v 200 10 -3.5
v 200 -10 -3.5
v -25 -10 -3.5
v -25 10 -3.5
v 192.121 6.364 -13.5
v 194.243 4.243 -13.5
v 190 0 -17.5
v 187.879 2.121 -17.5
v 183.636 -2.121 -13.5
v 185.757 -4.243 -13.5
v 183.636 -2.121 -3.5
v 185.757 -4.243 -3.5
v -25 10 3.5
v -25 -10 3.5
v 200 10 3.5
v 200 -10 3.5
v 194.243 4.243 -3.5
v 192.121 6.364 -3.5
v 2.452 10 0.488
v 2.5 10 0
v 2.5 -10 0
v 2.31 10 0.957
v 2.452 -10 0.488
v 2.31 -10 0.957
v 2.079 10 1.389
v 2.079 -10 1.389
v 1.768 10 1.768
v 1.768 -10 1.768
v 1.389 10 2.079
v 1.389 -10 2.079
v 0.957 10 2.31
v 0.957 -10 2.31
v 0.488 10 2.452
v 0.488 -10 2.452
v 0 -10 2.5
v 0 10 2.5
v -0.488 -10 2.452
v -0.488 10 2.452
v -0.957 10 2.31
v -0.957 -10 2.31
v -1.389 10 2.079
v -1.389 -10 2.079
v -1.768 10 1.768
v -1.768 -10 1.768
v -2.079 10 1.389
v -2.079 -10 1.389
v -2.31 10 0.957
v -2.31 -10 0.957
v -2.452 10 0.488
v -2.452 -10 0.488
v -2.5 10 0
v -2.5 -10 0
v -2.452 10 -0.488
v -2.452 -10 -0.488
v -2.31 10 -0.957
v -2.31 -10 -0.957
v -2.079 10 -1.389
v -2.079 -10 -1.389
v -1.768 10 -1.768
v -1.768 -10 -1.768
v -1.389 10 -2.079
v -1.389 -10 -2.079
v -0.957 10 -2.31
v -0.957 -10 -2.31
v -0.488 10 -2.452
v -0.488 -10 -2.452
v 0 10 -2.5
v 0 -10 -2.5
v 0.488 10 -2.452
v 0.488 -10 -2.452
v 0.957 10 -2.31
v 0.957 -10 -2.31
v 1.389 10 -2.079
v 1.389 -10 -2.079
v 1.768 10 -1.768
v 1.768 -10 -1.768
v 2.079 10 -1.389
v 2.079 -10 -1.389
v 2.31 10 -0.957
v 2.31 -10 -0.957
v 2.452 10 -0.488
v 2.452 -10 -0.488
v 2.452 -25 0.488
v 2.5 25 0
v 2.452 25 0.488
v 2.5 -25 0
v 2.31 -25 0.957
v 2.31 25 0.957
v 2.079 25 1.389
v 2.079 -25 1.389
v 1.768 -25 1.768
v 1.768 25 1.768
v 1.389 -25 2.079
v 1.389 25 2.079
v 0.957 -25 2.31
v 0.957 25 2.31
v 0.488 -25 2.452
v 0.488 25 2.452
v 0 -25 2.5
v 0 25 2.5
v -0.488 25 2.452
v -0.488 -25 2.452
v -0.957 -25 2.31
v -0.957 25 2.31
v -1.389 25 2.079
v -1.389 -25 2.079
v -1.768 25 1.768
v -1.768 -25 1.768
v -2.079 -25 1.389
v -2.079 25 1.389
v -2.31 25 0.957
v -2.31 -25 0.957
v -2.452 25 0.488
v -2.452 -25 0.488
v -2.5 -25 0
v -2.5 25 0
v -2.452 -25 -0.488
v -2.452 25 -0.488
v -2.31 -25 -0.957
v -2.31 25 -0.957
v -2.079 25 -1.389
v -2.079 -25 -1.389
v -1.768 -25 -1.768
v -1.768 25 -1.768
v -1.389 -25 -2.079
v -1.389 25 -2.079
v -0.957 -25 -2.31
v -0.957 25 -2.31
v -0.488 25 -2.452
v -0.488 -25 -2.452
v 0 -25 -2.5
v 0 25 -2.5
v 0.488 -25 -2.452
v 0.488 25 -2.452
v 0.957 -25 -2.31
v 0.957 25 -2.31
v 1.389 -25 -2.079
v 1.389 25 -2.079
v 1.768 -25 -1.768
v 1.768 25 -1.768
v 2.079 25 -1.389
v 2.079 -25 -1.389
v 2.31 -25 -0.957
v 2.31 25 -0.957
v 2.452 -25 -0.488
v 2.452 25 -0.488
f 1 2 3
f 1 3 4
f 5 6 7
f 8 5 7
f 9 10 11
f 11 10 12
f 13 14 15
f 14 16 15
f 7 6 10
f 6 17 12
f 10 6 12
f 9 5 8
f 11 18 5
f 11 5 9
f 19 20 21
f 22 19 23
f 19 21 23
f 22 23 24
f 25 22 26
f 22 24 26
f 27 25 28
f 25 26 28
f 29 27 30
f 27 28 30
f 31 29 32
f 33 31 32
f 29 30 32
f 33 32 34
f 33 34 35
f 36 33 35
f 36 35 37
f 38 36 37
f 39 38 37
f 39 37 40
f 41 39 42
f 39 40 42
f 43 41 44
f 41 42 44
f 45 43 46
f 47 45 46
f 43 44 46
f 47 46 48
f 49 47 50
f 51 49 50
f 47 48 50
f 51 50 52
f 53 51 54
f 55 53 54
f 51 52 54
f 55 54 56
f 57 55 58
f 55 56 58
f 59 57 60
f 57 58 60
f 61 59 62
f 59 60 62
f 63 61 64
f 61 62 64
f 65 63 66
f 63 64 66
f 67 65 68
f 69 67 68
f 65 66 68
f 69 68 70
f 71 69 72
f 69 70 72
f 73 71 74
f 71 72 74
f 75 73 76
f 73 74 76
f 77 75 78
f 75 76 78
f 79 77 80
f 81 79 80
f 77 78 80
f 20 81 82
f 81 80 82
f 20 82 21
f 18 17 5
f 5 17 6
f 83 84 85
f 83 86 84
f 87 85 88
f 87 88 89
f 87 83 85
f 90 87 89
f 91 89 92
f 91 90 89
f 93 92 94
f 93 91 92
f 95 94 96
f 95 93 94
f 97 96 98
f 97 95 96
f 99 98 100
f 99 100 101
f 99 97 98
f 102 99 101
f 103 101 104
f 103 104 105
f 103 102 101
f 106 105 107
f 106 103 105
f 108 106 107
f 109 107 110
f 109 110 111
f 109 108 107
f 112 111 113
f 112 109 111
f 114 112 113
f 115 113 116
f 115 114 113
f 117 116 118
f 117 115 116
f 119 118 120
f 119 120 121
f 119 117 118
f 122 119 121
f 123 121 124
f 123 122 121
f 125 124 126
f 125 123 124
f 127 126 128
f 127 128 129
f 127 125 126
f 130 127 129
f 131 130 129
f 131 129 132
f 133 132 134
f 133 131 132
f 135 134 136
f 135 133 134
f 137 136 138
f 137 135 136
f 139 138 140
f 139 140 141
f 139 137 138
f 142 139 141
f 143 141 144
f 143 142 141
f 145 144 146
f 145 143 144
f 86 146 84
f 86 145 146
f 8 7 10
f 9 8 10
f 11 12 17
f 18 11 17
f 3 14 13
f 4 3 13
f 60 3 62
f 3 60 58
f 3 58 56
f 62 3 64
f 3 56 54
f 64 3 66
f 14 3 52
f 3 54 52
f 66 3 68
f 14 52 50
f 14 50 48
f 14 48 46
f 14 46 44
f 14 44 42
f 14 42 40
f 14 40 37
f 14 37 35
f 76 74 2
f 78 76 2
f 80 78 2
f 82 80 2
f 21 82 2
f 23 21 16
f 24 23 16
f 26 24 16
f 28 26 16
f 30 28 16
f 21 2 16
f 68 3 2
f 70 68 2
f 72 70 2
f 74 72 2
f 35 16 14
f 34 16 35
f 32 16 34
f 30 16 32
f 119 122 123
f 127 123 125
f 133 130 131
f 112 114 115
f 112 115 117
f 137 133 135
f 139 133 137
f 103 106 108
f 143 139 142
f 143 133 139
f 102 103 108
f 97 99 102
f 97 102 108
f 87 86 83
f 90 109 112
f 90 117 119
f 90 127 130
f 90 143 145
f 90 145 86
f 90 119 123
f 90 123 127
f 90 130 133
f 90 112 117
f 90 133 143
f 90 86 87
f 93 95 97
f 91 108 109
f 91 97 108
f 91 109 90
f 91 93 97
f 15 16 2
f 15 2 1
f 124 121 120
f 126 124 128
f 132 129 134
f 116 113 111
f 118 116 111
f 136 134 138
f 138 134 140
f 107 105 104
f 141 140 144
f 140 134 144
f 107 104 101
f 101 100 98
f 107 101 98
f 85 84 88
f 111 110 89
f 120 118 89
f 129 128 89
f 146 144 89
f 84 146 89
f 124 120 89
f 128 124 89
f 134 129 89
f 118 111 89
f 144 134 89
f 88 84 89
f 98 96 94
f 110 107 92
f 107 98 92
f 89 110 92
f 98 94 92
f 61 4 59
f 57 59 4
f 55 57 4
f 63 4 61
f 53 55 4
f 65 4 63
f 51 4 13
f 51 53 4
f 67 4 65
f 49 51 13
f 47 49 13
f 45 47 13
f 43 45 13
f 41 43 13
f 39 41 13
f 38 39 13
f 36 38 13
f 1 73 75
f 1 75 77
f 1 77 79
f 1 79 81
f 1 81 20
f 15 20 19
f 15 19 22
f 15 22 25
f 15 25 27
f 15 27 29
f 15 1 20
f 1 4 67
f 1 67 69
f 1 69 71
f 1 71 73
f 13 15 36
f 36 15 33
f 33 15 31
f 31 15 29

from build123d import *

# Parameters (mm, degrees)
F0_W      = 20
F0_H      = 7
F1_DEPTH  = 200
F2_DEPTH  = 25
F3_R      = 2.5
F4_DEPTH  = 20
F5_R      = 2.5
F6_DEPTH  = 25
F10_DEPTH = 3


with BuildPart() as f1:
    # F0 (on Right) → F1 (new body)
    with BuildSketch(Plane.YZ):
        Rectangle(F0_W, F0_H)
    extrude(amount=F1_DEPTH)

    # F2 (add): a face of the model
    f2_faces = [f1.faces().sort_by_distance(p)[0] for p in [
        (0, 0, 0),
    ]]
    extrude(f2_faces, amount=F2_DEPTH)

    # F3 (on face) → F4 (cut, through all)
    with BuildSketch(Plane.XZ.offset(10)):
        Circle(F3_R)
    extrude(amount=-F4_DEPTH, mode=Mode.SUBTRACT)


with BuildPart() as f6:
    # F5 (on Front) → F6 (new body, symmetric)
    with BuildSketch(Plane.XZ):
        Circle(F5_R)
    extrude(amount=F6_DEPTH, both=True)


with BuildPart() as f10:
    # F9 (on face) → F10 (new body)
    with BuildSketch(Plane(origin=(95, -95, 0), x_dir=(-0.7071067812, -0.7071067812, 0), z_dir=(-0.7071067812, 0.7071067812, 0))):
        Polygon((-128.3502884254, -3.5), (-140.3502884254, -3.5), (-140.3502884254, -13.5), (-134.3502884254, -17.5), (-128.3502884254, -13.5), align=None)
    extrude(amount=F10_DEPTH)


solid = Compound([f1.part, f6.part, f10.part])
